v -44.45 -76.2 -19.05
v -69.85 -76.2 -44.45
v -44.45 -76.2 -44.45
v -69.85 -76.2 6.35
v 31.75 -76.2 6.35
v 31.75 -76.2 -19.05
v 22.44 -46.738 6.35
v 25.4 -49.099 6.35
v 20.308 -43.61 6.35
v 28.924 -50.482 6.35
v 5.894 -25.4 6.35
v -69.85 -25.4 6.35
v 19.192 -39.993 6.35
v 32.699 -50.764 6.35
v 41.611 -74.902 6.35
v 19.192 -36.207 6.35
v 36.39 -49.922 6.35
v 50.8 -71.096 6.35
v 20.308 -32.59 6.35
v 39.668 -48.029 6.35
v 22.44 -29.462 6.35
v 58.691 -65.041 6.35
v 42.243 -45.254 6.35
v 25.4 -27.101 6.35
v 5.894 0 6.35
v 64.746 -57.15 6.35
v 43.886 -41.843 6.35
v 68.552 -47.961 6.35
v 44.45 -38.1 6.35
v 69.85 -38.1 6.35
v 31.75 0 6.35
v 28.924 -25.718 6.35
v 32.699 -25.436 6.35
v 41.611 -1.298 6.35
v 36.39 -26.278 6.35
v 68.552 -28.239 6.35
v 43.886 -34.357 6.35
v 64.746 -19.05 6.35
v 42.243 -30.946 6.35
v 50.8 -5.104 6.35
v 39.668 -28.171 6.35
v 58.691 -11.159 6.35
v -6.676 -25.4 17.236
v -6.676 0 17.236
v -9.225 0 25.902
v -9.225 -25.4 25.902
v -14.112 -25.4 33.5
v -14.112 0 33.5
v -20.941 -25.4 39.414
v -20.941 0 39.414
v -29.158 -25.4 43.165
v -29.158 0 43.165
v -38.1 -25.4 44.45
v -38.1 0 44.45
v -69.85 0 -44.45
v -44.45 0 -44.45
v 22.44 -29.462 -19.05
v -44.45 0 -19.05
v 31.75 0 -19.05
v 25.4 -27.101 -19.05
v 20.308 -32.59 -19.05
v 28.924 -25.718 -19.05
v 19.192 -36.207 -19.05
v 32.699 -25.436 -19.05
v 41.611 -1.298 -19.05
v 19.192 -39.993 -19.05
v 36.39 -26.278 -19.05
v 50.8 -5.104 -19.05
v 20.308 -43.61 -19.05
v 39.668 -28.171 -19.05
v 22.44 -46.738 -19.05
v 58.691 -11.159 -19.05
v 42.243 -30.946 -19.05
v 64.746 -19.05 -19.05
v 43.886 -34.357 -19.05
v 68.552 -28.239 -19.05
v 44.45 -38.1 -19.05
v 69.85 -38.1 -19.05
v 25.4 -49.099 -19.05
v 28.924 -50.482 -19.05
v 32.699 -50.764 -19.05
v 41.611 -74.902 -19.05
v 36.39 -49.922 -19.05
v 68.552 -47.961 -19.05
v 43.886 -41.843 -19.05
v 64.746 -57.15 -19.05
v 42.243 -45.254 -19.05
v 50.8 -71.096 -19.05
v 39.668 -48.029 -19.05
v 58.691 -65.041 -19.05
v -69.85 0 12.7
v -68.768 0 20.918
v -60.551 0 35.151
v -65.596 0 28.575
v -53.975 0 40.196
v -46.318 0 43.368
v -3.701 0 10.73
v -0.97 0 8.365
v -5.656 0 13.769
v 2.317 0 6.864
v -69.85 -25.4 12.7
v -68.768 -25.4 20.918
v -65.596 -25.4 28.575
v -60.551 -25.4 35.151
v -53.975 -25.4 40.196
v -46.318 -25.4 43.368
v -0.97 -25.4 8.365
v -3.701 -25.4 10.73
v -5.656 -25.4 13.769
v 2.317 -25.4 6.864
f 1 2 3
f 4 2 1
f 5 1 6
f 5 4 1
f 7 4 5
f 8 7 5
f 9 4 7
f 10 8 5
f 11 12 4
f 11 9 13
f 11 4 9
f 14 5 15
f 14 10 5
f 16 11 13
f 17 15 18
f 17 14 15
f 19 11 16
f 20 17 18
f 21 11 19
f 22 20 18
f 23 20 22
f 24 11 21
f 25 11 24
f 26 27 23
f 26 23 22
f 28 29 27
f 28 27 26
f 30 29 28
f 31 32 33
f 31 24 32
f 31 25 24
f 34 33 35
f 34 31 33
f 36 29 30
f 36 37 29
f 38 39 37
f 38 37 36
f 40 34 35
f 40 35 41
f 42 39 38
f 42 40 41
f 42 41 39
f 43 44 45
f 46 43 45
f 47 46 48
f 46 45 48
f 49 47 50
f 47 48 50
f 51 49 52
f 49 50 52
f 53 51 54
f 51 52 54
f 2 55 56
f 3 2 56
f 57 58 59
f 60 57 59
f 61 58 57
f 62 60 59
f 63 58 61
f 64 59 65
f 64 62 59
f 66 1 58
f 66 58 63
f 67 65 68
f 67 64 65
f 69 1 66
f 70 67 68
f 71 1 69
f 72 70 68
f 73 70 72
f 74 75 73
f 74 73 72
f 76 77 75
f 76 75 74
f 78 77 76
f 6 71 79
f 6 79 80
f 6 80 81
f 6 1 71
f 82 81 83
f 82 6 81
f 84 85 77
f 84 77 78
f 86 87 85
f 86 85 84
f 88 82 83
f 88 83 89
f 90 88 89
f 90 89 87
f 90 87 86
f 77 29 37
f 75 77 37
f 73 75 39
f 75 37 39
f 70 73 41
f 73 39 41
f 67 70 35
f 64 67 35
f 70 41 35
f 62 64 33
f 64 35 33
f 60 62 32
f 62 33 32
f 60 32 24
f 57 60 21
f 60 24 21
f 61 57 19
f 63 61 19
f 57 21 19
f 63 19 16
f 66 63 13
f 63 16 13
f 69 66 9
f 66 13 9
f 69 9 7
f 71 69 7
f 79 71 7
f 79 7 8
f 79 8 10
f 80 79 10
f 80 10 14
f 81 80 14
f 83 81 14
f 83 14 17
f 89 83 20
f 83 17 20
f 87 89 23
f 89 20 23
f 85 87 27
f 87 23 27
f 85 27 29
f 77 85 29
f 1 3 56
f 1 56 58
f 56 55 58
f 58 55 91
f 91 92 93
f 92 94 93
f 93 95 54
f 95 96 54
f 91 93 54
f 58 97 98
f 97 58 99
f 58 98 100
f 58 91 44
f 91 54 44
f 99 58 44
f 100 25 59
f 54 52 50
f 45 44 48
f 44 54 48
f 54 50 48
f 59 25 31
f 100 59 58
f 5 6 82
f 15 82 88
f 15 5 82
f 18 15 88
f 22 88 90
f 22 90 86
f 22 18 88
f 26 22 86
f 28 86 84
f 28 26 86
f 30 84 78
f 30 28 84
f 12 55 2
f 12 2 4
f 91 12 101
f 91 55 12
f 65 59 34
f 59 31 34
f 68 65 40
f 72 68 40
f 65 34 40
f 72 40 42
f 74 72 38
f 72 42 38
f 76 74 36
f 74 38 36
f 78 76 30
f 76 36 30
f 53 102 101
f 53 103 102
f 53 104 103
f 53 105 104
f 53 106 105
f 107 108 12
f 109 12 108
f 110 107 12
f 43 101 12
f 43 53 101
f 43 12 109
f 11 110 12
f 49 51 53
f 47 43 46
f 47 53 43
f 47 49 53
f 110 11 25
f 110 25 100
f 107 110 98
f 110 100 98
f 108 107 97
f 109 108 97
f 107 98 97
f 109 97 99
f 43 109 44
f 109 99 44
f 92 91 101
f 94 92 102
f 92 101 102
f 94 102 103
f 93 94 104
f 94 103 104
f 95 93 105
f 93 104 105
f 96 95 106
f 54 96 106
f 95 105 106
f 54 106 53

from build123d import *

# Parameters (mm, degrees)
F0_W         = 139.7
F0_H         = 88.9
F1_DEPTH     = 76.2
F2_W         = 76.2
F2_H         = 38.1
F3_DEPTH     = 76.2
F4_W         = 114.3
F4_H         = 25.4
F5_DEPTH     = 76.2
F6_W         = 63.5
F6_H         = 50.8
F7_DEPTH     = 38.1
F8_R         = 31.74999
F9_R         = 38.09999
F10_T1_DEPTH = 25.4
F11_R        = 12.7
F12_DEPTH    = 25.4


# Not quite as in the source:
# - a fillet or chamfer that OpenCascade refuses, or shapes differently, is made with other operations: its cross-section is extruded or revolved along the edge and cut away or added
# - a fillet or chamfer is up to 0.001 mm smaller than in the source, because OpenCascade refuses the exact size


with BuildPart() as f1:
    # F0 (on Front) → F1 (new body)
    with BuildSketch(Plane.XZ):
        Rectangle(F0_W, F0_H)
    extrude(amount=F1_DEPTH)

    # F2 (on face) → F3 (cut)
    with BuildSketch(Plane.XZ.offset(76.2)):
        with Locations((31.75, 25.4)):
            Rectangle(F2_W, F2_H)
    extrude(amount=-F3_DEPTH, mode=Mode.SUBTRACT)

    # F4 (on face) → F5 (cut)
    with BuildSketch(Plane.XZ.offset(76.2)):
        with Locations((12.7, -31.75)):
            Rectangle(F4_W, F4_H)
    extrude(amount=-F5_DEPTH, mode=Mode.SUBTRACT)

    # F6 (on face) → F7 (cut)
    with BuildSketch(Plane.XY.offset(44.45)):
        with Locations((-38.1, -50.8)):
            Rectangle(F6_W, F6_H)
    extrude(amount=-F7_DEPTH, mode=Mode.SUBTRACT)

    # F8 (radius 31.75 in the source; OpenCascade refuses exactly that, so slightly less here)
    f8_edges = [f1.edges().sort_by_distance(p)[0] for p in [
        (-69.85, -12.7, 44.45),
        (-6.35, -12.7, 44.45),
    ]]
    fillet(f8_edges, radius=F8_R)

    # F9 (radius 38.1 in the source; OpenCascade refuses exactly that, so slightly less here)
    f9_edges = [f1.edges().sort_by_distance(p)[0] for p in [
        (69.85, -76.2, -6.35),
        (69.85, 0, -6.35),
    ]]
    fillet(f9_edges, radius=F9_R)

    # F10: fillet of radius 12.7 on 1 edges, made by hand

    # F10_s2 → F10_t1 (join)
    with BuildSketch(Plane.XZ):
        with BuildLine():
            ThreePointArc((5.894091852, 6.35), (-2.4200107012, 9.4497031955), (-6.6756486478, 17.2357167347))
            Line((-6.6756486478, 17.2357167347), (-7.9326226978, 17.0542884082))
            ThreePointArc((-7.9326226978, 17.0542884082), (-7.62, 12.70001), (-7.62, 6.35))
            Line((-7.62, 6.35), (-6.35, 5.08))
            Line((-6.35, 5.08), (5.894091852, 5.08))
            Line((5.894091852, 5.08), (5.894091852, 6.35))
        make_face()
    extrude(amount=F10_T1_DEPTH)

    # F11 (on face) → F12 (cut)
    with BuildSketch(Plane.XY.offset(6.35)):
        with Locations((31.75, -38.1)):
            Circle(F11_R)
    extrude(amount=-F12_DEPTH, mode=Mode.SUBTRACT)


solid = f1.part
